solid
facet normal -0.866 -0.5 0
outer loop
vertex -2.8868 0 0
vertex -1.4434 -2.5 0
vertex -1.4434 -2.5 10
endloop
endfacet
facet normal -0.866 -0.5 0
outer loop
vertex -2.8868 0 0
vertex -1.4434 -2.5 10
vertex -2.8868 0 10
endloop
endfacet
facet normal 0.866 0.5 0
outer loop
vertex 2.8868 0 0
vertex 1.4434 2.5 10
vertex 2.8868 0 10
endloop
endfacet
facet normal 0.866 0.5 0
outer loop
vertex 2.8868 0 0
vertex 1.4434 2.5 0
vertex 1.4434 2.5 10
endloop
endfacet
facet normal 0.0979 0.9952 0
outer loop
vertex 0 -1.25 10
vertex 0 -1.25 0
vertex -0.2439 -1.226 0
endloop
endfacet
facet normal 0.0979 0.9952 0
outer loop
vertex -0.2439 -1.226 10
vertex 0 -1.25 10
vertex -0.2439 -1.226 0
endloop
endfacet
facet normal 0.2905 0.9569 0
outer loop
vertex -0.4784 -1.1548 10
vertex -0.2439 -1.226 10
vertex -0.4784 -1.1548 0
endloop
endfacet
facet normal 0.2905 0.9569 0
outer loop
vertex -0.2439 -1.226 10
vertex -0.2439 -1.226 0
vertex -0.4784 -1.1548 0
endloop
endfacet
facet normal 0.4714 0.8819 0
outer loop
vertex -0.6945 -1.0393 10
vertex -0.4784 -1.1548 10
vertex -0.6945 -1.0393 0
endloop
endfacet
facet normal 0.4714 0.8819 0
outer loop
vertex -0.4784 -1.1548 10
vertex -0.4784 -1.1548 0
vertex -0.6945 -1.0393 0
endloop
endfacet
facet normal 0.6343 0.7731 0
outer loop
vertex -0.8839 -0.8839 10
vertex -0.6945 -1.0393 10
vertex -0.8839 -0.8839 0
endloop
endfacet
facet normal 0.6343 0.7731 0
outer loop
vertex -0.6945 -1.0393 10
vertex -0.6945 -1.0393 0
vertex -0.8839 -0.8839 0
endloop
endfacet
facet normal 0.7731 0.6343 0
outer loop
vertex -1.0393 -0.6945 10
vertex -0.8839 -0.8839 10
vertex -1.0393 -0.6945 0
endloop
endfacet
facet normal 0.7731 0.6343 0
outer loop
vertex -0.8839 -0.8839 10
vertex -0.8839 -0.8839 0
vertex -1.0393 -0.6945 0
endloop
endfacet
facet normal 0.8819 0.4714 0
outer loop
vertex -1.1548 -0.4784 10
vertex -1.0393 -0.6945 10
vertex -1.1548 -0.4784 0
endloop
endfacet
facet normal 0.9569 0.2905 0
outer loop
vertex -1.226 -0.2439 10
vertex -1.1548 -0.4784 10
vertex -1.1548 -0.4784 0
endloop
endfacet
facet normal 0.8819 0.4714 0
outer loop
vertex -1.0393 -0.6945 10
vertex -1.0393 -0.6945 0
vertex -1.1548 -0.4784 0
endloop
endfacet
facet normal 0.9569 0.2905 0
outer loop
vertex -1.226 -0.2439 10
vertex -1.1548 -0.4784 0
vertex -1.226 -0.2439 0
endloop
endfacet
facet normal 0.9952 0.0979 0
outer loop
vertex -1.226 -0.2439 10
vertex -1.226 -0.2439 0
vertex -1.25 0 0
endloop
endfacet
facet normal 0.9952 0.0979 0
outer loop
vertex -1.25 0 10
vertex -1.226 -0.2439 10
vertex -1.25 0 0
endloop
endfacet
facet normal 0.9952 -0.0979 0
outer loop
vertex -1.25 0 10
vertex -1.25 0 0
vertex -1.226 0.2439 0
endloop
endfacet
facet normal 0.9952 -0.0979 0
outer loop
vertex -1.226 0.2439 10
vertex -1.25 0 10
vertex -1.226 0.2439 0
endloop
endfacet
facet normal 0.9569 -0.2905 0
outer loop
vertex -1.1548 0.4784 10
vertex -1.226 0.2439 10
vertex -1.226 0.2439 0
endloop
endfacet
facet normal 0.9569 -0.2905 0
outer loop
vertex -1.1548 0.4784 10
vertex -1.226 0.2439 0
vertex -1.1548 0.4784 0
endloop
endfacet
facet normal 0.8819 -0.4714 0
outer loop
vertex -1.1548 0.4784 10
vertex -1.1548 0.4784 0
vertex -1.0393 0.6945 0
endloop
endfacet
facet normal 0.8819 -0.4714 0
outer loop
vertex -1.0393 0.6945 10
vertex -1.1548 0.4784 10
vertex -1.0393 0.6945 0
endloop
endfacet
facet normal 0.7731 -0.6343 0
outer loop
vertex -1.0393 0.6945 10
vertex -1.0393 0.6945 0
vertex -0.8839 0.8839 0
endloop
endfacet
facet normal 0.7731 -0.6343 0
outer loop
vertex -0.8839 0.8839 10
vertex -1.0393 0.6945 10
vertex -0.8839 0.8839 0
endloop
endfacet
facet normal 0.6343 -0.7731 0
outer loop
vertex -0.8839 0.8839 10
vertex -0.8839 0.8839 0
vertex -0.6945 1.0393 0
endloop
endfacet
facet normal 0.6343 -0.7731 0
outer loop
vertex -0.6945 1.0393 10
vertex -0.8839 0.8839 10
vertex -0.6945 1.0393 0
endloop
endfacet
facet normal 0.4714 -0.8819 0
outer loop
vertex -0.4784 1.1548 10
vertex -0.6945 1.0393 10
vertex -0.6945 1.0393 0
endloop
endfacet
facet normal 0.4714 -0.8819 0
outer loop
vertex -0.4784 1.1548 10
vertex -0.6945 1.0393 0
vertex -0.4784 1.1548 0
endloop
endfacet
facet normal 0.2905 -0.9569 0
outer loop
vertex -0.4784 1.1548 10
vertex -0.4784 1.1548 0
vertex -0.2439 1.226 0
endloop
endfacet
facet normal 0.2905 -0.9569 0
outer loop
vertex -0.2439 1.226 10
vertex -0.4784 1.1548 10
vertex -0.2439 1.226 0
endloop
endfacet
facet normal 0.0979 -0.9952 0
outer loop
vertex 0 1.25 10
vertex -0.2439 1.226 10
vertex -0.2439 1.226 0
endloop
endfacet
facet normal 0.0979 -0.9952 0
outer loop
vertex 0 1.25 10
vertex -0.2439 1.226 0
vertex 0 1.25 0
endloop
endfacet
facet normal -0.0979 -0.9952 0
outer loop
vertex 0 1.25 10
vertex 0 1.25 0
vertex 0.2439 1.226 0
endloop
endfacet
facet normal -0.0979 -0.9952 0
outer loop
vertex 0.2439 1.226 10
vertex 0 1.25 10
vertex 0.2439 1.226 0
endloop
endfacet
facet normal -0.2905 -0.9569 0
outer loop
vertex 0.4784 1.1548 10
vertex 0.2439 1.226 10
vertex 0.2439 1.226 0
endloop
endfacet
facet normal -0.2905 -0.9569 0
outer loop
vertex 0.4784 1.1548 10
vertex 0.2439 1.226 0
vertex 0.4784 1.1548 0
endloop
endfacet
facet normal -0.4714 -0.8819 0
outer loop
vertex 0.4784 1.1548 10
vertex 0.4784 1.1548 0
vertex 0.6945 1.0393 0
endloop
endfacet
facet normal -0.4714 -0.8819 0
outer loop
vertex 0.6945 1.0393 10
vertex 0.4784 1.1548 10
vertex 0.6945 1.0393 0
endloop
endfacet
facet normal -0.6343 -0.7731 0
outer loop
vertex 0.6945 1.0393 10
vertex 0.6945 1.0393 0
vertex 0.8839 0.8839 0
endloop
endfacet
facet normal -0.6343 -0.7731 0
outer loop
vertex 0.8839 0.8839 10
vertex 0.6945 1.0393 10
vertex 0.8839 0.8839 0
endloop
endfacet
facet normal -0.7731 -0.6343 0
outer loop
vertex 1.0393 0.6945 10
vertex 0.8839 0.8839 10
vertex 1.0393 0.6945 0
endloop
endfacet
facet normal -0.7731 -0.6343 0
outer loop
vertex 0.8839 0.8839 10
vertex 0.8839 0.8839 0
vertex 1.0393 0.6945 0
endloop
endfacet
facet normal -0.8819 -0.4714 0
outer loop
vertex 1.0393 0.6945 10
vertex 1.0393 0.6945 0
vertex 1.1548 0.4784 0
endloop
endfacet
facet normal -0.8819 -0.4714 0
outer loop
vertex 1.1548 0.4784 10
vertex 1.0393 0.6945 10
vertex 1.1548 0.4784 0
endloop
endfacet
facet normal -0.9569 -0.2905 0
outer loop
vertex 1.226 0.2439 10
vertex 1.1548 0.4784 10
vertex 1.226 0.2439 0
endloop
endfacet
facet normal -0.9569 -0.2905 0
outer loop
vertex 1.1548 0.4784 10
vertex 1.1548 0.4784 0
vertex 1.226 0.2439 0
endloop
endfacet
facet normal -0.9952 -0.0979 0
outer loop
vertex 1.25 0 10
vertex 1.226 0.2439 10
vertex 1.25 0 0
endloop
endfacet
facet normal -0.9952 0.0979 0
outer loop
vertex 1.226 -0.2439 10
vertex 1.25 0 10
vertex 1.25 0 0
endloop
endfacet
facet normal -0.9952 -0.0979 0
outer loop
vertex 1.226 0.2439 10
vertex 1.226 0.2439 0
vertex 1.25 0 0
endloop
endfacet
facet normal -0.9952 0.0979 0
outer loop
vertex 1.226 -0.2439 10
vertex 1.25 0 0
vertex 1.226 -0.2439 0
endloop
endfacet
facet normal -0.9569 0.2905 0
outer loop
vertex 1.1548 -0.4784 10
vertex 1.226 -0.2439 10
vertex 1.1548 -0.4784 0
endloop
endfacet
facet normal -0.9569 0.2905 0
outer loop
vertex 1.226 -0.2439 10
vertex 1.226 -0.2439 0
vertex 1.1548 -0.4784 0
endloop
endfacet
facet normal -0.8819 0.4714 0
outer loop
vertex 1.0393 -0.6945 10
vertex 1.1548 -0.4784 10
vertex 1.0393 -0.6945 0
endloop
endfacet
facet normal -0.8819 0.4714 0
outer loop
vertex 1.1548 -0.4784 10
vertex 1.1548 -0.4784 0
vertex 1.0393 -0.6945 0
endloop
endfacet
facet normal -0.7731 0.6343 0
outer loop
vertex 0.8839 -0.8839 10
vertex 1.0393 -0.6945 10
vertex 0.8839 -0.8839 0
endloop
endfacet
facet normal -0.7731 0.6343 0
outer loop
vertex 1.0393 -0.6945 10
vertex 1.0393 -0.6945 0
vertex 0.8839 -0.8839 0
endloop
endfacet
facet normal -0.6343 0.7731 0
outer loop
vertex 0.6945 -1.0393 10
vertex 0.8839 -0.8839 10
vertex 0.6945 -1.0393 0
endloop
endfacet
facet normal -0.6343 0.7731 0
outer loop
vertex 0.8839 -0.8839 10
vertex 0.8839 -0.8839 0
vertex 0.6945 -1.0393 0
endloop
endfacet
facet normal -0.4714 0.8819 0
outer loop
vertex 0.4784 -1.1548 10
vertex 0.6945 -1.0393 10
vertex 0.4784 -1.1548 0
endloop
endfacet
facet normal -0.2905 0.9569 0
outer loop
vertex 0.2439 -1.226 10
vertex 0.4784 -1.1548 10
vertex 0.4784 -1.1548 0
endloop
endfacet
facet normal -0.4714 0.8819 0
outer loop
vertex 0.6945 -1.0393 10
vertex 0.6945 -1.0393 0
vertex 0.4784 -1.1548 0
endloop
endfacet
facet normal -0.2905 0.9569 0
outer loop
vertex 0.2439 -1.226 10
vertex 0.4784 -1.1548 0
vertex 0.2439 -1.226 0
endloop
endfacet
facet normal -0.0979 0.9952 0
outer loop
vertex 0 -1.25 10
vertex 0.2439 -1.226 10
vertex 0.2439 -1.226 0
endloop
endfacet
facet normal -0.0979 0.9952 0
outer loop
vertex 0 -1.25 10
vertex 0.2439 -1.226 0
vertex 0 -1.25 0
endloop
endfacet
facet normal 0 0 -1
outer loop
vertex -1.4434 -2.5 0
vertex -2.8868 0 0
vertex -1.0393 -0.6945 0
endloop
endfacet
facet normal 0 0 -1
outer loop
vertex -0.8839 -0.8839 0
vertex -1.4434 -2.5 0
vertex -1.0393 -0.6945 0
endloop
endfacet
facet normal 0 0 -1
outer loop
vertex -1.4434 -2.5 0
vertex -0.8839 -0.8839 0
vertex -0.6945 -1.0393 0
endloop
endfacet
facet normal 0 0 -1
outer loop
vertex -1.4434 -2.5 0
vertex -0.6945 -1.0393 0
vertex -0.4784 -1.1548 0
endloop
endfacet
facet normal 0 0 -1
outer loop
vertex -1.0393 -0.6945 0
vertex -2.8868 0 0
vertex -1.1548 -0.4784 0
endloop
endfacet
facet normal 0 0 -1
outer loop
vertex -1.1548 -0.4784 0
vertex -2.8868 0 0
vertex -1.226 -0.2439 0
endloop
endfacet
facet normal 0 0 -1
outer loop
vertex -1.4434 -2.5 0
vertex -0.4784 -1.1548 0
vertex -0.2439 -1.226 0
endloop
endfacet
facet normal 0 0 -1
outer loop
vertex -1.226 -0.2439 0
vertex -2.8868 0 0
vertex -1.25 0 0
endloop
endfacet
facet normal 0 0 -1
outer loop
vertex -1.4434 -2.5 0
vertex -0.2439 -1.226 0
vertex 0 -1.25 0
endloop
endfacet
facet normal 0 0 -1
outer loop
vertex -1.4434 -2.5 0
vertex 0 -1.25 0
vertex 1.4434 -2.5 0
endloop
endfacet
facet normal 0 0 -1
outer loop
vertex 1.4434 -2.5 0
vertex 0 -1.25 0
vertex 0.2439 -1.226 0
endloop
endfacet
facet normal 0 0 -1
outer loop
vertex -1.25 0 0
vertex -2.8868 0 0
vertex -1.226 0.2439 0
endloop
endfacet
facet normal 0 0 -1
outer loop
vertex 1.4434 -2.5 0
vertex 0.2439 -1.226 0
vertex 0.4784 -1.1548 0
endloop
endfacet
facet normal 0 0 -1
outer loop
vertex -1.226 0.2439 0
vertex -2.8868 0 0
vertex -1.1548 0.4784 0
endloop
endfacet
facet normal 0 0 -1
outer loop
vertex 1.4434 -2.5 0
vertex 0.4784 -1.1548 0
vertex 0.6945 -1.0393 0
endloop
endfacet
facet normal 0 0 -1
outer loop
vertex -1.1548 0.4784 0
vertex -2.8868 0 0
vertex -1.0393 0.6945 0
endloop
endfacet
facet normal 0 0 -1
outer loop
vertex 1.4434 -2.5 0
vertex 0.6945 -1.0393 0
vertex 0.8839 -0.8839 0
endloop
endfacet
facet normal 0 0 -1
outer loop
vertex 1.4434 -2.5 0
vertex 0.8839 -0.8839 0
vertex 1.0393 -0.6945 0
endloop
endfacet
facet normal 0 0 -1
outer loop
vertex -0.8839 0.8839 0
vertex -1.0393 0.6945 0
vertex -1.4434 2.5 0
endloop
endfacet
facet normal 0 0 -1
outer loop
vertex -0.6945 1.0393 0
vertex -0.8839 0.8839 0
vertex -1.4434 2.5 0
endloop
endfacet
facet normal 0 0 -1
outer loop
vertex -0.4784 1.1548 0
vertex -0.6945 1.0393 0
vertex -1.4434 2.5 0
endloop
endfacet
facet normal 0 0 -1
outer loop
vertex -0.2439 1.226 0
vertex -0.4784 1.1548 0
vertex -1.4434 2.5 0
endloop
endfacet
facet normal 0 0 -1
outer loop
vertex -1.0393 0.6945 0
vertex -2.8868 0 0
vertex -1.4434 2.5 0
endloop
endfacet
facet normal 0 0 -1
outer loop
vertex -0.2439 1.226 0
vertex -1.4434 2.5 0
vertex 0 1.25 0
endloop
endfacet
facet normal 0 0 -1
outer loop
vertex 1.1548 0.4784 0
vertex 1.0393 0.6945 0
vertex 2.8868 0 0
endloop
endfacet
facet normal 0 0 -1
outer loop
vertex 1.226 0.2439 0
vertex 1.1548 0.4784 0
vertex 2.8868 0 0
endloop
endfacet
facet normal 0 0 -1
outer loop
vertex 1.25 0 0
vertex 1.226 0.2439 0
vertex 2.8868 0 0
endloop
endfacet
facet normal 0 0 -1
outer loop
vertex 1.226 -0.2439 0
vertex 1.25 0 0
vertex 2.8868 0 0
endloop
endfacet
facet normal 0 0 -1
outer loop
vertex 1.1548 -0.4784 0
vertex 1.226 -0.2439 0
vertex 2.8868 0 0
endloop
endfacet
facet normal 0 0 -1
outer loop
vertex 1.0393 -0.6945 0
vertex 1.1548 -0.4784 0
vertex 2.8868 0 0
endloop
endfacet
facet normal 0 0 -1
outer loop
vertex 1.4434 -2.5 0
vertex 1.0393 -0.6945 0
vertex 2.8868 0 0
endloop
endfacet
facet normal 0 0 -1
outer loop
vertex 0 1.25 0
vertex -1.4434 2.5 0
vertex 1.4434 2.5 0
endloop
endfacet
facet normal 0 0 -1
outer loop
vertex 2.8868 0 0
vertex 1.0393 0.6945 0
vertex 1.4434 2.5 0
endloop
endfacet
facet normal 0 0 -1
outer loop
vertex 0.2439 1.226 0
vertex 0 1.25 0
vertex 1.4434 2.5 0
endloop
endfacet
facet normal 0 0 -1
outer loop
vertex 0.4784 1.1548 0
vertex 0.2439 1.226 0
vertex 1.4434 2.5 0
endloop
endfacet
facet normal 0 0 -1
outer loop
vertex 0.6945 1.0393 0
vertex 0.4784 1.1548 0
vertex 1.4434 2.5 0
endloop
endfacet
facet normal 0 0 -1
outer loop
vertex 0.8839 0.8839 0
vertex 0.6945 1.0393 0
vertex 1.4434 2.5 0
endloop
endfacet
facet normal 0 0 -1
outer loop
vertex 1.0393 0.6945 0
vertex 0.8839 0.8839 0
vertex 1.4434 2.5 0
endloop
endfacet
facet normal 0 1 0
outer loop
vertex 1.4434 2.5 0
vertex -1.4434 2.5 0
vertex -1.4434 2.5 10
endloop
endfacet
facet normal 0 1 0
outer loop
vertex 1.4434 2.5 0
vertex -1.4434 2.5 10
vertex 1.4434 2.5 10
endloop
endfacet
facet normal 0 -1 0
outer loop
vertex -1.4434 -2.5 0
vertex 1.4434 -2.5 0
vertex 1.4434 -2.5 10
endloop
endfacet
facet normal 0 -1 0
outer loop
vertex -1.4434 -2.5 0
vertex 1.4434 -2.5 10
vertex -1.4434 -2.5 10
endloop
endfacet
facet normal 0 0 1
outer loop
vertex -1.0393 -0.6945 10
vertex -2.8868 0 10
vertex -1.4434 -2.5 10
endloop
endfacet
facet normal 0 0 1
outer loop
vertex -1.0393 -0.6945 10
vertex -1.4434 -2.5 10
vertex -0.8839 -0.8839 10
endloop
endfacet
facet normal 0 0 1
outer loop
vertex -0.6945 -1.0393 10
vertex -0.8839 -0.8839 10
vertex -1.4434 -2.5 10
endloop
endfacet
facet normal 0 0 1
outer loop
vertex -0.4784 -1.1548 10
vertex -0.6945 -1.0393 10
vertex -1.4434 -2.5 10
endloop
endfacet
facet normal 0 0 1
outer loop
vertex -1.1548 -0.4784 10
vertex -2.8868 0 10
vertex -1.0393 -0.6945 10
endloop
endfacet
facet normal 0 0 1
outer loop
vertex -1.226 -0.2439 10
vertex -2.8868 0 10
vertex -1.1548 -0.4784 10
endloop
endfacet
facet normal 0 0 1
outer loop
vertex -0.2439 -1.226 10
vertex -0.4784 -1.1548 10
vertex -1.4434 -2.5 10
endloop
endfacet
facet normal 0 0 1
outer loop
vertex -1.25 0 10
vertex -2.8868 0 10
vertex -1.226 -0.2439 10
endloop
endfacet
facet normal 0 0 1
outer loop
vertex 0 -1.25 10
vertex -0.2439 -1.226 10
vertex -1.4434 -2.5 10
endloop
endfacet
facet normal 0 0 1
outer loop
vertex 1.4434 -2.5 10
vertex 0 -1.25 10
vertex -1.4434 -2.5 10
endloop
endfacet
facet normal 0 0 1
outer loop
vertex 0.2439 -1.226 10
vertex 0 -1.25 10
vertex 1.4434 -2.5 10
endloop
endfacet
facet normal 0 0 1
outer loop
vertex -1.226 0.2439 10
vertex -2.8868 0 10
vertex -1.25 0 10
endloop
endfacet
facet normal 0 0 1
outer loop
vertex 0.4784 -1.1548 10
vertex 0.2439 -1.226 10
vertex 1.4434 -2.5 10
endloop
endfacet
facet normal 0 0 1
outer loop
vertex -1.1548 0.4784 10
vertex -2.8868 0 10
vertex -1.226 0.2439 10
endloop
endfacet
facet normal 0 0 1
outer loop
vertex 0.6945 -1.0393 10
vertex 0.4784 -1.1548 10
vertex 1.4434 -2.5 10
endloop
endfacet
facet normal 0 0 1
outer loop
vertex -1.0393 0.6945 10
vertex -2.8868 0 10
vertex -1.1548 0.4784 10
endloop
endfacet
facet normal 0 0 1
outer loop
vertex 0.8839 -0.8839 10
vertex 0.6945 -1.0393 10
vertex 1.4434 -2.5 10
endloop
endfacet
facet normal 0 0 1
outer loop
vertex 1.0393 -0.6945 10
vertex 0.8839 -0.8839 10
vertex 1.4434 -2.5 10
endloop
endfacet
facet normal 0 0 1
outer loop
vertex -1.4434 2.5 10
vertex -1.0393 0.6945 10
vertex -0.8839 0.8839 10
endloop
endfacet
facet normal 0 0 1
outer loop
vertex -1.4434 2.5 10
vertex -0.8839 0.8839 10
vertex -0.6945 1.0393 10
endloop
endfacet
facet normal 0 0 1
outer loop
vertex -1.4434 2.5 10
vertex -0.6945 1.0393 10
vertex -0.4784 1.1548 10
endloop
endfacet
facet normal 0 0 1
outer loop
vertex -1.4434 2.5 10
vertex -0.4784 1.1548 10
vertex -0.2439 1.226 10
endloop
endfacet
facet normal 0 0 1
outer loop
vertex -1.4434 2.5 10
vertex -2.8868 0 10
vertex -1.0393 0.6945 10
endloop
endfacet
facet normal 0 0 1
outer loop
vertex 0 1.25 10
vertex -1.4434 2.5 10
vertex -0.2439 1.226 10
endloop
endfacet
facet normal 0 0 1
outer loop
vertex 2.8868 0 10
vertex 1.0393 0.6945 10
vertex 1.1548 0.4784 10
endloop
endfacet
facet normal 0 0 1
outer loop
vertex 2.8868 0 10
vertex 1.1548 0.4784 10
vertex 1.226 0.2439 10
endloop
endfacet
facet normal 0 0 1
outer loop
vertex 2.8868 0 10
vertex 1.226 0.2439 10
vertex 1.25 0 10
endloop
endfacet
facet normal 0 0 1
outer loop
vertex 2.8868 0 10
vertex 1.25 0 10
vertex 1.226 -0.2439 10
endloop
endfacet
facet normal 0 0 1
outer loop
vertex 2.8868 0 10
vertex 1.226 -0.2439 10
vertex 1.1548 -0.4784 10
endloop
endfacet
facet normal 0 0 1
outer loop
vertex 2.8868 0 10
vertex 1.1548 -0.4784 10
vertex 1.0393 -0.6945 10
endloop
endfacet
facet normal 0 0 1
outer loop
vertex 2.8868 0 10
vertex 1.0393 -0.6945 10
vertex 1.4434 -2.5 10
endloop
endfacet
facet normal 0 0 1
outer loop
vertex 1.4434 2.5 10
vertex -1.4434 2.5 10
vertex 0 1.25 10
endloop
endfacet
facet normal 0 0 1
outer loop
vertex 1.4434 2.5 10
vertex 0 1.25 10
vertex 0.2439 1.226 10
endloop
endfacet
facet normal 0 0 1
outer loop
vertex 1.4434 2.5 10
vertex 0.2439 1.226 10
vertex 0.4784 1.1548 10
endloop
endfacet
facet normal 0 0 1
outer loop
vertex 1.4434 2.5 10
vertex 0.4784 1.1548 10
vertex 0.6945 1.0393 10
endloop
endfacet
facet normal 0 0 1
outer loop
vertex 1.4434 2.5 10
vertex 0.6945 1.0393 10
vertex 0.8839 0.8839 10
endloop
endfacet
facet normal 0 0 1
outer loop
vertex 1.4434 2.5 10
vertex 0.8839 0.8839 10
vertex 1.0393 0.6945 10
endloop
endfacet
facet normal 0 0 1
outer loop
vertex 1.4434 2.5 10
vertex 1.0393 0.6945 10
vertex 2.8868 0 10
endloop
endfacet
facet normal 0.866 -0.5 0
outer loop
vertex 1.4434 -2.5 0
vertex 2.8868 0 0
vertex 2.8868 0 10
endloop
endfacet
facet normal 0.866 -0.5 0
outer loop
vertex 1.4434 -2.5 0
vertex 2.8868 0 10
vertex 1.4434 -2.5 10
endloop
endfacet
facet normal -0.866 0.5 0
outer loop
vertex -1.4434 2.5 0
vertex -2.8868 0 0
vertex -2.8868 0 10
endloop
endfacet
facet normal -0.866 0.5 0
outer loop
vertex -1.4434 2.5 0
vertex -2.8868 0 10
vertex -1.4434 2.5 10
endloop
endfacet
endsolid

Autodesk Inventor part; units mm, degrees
ref_plane "YZ Plane" through (0, 0, 0) normal (1, 0, 0) x (0, 1, 0)
ref_plane "XZ Plane" through (0, 0, 0) normal (0, 1, 0) x (-1, 0, 0)
ref_plane "XY Plane" through (0, 0, 0) normal (0, 0, 1) x (1, 0, 0)
sketch "Skizze1" plane through (0, 0, 0) normal (0, 0, 1) x (1, 0, 0)
  line L0 (-1.4434, 2.5) -> (1.4434, 2.5)
  line L1 (1.4434, 2.5) -> (2.8868, 0)
  line L2 (2.8868, 0) -> (1.4434, -2.5)
  line L3 (1.4434, -2.5) -> (-1.4434, -2.5)
  line L4 (-1.4434, -2.5) -> (-2.8868, 0)
  line L5 (-2.8868, 0) -> (-1.4434, 2.5)
  point P0 (0, 0)
  point P1 (0, 0)
  point P2 (0, 2.5)
  point P3 (0, -2.5)
  dimension "d3" = 120
  dimension "d4" = 120
  dimension "d5" = 120
  dimension "d6" = 5
extrude "Extrusion1" add sketch "Skizze1" along normal blind 10
sketch "Skizze2" plane through (0, 0, 10) normal (0, 0, 1) x (1, 0, 0)
  point P0 (0, 0)
  point P1 (0, 0)
hole "Bohrung1" at (0, 0, 10) direction (0, 0, -1) diameter 2.5 end through all
thread "Gewinde1" size "M2.5x0.45" class "6H" standard "ANSI Metric M Profile" full length
properties part number "10mm_Innengewinde"
